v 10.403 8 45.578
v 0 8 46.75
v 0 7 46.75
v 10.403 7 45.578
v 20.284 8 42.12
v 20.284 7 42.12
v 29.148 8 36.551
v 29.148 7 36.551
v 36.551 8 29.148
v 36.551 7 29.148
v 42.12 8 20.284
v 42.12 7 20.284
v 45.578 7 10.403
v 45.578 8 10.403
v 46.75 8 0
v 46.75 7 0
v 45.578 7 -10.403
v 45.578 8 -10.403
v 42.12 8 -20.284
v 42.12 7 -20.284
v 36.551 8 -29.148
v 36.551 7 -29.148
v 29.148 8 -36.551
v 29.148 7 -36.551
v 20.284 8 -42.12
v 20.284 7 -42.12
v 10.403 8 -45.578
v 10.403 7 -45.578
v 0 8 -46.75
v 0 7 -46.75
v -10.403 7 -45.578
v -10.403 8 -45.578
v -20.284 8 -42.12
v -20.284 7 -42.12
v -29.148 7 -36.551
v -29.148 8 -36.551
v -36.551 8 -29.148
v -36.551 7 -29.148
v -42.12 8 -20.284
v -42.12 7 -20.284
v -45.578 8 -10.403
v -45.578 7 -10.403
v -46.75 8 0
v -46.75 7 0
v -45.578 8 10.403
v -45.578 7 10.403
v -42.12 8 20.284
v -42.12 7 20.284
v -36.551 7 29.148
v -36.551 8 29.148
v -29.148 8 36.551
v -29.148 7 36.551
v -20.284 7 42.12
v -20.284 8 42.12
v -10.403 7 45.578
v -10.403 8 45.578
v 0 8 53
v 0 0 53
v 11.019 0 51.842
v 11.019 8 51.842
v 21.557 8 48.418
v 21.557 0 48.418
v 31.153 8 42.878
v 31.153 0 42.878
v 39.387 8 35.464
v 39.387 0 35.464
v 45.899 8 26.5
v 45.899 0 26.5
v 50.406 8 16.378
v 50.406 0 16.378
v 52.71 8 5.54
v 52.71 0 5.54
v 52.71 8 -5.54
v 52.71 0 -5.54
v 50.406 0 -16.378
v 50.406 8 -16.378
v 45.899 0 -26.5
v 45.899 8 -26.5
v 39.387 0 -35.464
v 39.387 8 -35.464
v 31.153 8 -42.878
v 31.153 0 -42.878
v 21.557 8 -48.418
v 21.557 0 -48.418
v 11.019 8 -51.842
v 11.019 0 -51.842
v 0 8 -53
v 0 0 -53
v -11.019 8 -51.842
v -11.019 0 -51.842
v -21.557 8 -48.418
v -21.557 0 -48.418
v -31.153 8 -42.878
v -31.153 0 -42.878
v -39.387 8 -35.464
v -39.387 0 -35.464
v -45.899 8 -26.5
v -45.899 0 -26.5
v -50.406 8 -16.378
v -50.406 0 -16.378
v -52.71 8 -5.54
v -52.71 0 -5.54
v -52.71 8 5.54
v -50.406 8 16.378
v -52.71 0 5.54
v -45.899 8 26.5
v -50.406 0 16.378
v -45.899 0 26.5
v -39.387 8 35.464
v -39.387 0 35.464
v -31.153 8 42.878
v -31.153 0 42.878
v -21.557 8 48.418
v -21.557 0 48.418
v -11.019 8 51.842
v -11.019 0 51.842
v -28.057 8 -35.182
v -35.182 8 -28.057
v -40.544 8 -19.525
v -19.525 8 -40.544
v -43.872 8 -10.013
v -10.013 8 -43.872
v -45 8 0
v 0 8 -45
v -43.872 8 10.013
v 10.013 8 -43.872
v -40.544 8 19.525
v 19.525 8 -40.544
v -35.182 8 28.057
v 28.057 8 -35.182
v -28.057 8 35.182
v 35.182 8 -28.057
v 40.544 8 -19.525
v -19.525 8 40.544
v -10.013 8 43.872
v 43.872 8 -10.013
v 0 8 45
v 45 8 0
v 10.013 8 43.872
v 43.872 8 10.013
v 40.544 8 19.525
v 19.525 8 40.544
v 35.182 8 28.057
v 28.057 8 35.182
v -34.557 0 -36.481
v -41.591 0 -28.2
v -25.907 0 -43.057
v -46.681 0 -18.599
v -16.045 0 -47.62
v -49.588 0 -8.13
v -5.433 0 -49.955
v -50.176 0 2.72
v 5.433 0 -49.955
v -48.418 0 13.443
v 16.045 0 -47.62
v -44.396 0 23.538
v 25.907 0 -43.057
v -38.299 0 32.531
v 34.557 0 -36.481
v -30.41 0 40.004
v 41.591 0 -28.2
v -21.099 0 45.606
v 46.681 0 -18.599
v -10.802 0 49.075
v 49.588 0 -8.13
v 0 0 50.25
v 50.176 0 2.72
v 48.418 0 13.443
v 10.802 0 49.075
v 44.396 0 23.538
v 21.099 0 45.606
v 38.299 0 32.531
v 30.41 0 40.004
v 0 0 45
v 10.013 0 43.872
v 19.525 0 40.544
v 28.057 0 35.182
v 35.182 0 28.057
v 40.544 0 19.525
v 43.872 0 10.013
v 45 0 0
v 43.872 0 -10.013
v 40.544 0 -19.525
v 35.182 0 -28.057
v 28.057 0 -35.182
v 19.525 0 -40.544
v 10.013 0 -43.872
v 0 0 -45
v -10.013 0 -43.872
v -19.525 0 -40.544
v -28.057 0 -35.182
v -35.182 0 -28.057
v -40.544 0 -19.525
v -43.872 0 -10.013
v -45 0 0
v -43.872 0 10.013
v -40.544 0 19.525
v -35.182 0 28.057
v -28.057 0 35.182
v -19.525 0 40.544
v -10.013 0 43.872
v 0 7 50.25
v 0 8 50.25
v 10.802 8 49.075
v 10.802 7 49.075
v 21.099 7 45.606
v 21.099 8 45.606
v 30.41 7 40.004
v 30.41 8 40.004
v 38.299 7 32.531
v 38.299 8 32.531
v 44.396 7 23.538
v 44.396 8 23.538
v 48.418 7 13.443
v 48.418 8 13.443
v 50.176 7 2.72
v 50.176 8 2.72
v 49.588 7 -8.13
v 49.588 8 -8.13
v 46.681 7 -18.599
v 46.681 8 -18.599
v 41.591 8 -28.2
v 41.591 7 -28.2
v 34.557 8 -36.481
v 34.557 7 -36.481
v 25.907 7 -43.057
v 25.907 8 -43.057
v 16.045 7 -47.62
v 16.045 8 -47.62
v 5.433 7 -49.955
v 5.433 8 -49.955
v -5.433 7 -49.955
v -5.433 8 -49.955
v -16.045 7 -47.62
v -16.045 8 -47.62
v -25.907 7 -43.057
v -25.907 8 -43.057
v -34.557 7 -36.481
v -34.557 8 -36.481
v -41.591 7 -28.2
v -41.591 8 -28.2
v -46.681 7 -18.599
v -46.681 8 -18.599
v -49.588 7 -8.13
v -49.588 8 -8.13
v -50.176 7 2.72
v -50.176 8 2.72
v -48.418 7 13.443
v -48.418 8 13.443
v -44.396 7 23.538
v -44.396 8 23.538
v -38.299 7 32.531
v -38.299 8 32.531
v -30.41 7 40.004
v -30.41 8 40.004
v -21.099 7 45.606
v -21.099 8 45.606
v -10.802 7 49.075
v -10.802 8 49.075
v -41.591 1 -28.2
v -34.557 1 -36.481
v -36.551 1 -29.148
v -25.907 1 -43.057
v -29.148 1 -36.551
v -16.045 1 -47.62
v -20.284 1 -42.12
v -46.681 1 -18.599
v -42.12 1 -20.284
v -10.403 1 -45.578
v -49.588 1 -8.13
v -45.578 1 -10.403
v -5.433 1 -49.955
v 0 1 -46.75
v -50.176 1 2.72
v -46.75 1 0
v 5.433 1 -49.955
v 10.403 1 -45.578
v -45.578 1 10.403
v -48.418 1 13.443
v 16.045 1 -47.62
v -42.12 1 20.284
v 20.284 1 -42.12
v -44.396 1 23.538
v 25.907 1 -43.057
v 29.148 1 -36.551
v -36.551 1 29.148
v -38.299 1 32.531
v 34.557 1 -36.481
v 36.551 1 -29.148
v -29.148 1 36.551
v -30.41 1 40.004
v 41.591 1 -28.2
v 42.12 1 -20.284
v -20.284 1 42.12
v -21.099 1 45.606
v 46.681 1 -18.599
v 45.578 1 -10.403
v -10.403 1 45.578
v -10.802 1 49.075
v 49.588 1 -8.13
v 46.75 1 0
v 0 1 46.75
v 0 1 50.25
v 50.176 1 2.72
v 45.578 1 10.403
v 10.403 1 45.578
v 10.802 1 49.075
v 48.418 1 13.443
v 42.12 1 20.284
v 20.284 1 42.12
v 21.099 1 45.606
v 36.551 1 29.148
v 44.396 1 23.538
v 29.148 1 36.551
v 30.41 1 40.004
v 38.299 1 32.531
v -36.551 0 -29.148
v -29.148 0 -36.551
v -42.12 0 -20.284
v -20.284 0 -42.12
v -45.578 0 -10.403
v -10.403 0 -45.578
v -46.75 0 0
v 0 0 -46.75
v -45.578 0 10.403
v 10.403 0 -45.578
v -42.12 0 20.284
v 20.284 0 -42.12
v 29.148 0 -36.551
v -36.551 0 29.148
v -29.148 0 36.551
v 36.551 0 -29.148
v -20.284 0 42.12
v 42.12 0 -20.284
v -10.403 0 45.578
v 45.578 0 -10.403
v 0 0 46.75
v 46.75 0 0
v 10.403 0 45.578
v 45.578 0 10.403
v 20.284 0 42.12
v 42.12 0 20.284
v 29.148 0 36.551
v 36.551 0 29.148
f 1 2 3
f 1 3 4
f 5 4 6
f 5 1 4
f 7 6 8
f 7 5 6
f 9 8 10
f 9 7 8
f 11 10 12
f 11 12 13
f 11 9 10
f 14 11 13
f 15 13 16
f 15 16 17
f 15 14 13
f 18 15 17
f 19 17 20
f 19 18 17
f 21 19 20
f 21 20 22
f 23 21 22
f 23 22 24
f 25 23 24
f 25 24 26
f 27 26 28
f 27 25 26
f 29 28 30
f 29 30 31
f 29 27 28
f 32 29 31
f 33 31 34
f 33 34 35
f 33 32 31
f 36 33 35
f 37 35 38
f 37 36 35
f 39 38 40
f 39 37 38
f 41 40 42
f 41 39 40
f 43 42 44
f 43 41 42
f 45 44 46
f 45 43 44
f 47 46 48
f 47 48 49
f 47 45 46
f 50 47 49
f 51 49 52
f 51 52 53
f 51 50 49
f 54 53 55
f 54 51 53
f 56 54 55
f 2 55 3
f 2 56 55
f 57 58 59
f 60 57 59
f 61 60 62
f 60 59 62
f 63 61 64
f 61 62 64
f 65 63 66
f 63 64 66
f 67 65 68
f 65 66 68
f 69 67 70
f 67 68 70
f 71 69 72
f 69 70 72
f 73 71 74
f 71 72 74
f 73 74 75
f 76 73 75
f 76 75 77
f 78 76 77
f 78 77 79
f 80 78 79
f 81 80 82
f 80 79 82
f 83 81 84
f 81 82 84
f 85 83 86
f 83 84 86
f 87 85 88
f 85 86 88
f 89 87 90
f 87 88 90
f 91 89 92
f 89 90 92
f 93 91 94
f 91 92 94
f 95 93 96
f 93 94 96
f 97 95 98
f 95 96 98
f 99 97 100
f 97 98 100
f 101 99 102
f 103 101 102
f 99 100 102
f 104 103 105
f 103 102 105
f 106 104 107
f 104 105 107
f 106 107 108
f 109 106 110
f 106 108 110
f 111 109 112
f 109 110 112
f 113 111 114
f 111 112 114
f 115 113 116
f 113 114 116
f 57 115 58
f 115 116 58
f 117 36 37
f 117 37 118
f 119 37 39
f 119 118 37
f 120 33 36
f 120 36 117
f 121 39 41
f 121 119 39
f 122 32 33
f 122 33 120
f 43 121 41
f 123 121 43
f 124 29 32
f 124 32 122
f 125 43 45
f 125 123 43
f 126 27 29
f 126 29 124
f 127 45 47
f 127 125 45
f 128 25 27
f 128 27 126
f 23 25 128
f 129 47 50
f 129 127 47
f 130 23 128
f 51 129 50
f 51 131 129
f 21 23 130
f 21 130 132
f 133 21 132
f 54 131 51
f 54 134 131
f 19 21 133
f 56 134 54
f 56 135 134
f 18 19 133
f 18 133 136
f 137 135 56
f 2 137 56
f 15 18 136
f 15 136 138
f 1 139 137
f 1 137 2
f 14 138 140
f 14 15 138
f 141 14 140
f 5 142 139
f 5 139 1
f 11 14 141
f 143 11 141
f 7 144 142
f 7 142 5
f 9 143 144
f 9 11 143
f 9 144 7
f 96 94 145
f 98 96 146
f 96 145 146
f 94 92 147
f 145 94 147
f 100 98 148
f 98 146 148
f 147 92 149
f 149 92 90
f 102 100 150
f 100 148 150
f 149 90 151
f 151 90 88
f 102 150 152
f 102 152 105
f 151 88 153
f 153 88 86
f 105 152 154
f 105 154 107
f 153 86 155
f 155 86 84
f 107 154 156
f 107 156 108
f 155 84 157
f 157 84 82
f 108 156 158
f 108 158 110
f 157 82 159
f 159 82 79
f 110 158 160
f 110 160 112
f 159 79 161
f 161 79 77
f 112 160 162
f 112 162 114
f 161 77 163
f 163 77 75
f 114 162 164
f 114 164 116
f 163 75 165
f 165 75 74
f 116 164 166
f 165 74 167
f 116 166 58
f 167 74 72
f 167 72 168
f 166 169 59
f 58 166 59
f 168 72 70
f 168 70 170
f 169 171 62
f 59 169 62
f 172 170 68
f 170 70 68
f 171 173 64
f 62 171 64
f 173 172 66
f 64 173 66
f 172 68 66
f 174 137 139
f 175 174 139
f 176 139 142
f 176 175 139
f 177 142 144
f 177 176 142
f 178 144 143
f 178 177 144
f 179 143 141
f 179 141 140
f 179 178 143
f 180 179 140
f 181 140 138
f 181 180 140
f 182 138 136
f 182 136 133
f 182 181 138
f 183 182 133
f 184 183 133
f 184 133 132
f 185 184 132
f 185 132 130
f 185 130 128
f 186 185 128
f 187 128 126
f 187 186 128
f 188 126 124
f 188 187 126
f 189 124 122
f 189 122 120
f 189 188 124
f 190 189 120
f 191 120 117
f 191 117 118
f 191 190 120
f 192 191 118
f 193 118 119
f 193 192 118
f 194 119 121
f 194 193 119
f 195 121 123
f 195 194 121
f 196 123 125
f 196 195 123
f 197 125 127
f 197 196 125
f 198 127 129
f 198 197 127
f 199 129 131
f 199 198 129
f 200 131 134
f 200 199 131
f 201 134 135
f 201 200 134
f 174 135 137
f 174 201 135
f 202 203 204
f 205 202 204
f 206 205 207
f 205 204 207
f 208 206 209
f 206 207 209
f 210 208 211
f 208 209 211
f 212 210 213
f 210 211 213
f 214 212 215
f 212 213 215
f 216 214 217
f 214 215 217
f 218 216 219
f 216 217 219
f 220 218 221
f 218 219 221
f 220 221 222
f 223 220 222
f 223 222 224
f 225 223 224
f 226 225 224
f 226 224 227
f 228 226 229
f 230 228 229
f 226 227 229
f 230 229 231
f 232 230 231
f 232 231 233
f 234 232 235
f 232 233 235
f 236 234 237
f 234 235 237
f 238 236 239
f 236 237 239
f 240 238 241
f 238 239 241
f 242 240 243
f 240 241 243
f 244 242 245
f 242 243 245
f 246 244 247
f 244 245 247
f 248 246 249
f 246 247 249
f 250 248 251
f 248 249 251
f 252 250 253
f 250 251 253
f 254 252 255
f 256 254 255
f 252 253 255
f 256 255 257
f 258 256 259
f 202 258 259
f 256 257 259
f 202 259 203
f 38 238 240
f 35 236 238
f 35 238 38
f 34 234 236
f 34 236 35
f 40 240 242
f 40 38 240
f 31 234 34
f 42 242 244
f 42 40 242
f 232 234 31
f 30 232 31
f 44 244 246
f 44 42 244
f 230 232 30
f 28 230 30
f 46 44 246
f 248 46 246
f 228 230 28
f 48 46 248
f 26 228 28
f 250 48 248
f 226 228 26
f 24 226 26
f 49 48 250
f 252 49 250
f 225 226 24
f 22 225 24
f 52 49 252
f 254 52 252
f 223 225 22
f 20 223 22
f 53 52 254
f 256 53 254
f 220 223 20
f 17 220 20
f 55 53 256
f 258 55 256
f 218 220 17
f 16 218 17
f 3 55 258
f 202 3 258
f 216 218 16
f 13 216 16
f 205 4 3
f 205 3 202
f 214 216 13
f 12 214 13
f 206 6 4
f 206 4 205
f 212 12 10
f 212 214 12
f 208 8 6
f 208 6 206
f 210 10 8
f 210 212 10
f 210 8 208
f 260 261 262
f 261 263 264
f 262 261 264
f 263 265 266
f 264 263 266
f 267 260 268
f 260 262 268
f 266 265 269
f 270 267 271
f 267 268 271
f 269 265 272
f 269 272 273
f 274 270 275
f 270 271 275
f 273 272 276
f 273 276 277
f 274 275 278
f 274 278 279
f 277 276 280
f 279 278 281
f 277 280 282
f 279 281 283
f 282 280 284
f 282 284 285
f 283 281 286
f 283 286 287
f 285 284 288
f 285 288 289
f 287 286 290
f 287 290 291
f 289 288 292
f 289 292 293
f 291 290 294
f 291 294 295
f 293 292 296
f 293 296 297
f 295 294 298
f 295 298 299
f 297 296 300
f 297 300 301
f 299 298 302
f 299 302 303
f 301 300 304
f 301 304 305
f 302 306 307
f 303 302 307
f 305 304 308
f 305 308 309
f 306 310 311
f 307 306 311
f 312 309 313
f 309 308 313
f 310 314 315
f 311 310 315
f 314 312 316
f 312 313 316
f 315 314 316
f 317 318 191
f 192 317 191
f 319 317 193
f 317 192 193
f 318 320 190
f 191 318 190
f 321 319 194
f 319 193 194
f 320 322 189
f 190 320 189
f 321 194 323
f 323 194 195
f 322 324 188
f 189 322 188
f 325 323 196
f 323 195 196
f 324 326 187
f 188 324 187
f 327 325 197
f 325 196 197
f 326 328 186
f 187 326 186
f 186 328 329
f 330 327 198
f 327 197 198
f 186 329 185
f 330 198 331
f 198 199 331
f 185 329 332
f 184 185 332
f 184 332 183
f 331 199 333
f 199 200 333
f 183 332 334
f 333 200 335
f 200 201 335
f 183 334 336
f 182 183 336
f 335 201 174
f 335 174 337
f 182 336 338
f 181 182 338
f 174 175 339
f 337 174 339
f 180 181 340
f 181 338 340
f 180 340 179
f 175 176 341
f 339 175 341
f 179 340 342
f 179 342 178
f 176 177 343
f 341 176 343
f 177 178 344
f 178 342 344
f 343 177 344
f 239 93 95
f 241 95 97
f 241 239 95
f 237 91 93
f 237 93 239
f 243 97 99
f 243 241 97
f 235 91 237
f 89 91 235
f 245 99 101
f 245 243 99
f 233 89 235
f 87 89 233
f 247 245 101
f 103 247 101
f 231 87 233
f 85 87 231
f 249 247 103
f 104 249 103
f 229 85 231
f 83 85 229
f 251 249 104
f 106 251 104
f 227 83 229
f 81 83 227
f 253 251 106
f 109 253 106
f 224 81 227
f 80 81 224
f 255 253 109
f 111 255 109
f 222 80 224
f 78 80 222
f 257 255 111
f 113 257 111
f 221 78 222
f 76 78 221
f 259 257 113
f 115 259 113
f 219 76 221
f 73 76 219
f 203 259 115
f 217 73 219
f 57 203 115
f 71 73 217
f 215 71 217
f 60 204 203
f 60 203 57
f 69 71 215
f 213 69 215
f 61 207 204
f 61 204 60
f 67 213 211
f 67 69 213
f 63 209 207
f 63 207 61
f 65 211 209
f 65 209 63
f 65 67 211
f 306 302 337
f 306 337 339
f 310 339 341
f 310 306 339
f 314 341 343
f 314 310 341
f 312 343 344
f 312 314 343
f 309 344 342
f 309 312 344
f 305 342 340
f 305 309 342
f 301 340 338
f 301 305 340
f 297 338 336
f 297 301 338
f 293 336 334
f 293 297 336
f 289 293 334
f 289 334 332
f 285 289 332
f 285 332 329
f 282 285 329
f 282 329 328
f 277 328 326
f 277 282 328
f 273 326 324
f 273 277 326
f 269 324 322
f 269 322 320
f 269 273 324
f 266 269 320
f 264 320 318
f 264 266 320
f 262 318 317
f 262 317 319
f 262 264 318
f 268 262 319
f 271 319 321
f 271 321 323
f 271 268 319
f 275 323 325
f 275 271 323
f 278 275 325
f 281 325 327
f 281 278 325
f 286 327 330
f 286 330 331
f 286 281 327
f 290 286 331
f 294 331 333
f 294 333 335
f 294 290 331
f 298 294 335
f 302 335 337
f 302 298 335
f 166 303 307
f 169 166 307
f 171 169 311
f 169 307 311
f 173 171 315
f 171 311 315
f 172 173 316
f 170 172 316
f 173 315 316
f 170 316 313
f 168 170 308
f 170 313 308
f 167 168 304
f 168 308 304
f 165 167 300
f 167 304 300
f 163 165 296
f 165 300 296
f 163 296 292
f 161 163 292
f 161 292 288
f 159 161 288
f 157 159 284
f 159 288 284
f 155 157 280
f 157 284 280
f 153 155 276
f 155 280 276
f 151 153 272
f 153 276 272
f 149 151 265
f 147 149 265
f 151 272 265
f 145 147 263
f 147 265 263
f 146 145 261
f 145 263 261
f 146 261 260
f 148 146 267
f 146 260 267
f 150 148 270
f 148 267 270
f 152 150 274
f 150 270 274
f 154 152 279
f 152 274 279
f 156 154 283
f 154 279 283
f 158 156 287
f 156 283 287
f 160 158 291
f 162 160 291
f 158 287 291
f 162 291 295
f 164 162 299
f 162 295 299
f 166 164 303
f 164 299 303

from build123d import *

# Parameters (mm, degrees)
SKETCH_1_R          = 53
SKETCH_1_R_2        = 45
EXTRUDE_1_DEPTH     = 8
SKETCH_2_R          = 50.25
SKETCH_2_R_2        = 46.75
CUT_EXTRUDE_1_DEPTH = 1
CUT_EXTRUDE_START   = -7
SKETCH_2_2_R        = 50.25
SKETCH_2_2_R_2      = 46.75
CUT_EXTRUDE_2_DEPTH = 1


with BuildPart() as part:
    # 草图1 → 凸台-拉伸1 (new body)
    with BuildSketch(Plane(origin=(0, 0, 0), x_dir=(1, 0, 0), z_dir=(0, 1, 0))):
        with Locations(Location((0, 0, 0), (0, 0, 270))):
            Circle(SKETCH_1_R)
        with Locations(Location((0, 0, 0), (0, 0, 270))):
            Circle(SKETCH_1_R_2, mode=Mode.SUBTRACT)
    extrude(amount=EXTRUDE_1_DEPTH)

    # 草图2 → 切除-拉伸1 (cut)
    with BuildSketch(Plane(origin=(0, 8, 0), x_dir=(1, 0, 0), z_dir=(0, 1, 0))):
        with Locations(Location((0, 0, 0), (0, 0, 270))):
            Circle(SKETCH_2_R)
        with Locations(Location((0, 0, 0), (0, 0, 270))):
            Circle(SKETCH_2_R_2, mode=Mode.SUBTRACT)
    extrude(amount=-CUT_EXTRUDE_1_DEPTH, mode=Mode.SUBTRACT)

    # 草图2<2> → 切除-拉伸2 (cut)
    with BuildSketch(Plane(origin=(0, 8, 0), x_dir=(1, 0, 0), z_dir=(0, 1, 0)).offset(CUT_EXTRUDE_START)):
        with Locations(Location((0, 0, 0), (0, 0, 270))):
            Circle(SKETCH_2_2_R)
        with Locations(Location((0, 0, 0), (0, 0, 270))):
            Circle(SKETCH_2_2_R_2, mode=Mode.SUBTRACT)
    extrude(amount=-CUT_EXTRUDE_2_DEPTH, mode=Mode.SUBTRACT)


solid = part.part
